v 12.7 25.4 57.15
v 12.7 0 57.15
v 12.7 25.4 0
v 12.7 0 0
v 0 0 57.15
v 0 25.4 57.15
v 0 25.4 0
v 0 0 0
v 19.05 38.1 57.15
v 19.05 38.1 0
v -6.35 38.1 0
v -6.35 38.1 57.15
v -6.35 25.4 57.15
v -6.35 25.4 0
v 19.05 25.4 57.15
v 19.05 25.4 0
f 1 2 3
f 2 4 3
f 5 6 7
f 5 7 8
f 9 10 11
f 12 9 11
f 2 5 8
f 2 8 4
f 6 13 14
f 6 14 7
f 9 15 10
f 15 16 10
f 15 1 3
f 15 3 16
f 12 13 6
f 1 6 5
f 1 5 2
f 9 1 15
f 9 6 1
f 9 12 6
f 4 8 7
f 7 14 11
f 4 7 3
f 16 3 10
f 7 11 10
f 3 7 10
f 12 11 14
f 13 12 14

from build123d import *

# Parameters (mm, degrees)
F1_DEPTH = 25.4
F2_DEPTH = 31.75


with BuildPart() as f1:
    # F0 (on Top) → F1 (new body)
    with BuildSketch(Plane.XY):
        Polygon((0, 25.4), (0, 0), (12.7, 0), (12.7, 25.4), (19.05, 25.4), (19.05, 38.1), (-6.35, 38.1), (-6.35, 25.4), align=None)
    extrude(amount=F1_DEPTH)

    # F1_face (on face) → F2 (join)
    with BuildSketch(Plane(origin=(6.35, 22.225, 25.4), x_dir=(1, 0, 0), z_dir=(0, 0, 1))):
        Polygon((-12.7, 3.175), (-6.35, 3.175), (-6.35, -22.225), (6.35, -22.225), (6.35, 3.175), (12.7, 3.175), (12.7, 15.875), (-12.7, 15.875), align=None)
    extrude(amount=F2_DEPTH)


solid = f1.part
